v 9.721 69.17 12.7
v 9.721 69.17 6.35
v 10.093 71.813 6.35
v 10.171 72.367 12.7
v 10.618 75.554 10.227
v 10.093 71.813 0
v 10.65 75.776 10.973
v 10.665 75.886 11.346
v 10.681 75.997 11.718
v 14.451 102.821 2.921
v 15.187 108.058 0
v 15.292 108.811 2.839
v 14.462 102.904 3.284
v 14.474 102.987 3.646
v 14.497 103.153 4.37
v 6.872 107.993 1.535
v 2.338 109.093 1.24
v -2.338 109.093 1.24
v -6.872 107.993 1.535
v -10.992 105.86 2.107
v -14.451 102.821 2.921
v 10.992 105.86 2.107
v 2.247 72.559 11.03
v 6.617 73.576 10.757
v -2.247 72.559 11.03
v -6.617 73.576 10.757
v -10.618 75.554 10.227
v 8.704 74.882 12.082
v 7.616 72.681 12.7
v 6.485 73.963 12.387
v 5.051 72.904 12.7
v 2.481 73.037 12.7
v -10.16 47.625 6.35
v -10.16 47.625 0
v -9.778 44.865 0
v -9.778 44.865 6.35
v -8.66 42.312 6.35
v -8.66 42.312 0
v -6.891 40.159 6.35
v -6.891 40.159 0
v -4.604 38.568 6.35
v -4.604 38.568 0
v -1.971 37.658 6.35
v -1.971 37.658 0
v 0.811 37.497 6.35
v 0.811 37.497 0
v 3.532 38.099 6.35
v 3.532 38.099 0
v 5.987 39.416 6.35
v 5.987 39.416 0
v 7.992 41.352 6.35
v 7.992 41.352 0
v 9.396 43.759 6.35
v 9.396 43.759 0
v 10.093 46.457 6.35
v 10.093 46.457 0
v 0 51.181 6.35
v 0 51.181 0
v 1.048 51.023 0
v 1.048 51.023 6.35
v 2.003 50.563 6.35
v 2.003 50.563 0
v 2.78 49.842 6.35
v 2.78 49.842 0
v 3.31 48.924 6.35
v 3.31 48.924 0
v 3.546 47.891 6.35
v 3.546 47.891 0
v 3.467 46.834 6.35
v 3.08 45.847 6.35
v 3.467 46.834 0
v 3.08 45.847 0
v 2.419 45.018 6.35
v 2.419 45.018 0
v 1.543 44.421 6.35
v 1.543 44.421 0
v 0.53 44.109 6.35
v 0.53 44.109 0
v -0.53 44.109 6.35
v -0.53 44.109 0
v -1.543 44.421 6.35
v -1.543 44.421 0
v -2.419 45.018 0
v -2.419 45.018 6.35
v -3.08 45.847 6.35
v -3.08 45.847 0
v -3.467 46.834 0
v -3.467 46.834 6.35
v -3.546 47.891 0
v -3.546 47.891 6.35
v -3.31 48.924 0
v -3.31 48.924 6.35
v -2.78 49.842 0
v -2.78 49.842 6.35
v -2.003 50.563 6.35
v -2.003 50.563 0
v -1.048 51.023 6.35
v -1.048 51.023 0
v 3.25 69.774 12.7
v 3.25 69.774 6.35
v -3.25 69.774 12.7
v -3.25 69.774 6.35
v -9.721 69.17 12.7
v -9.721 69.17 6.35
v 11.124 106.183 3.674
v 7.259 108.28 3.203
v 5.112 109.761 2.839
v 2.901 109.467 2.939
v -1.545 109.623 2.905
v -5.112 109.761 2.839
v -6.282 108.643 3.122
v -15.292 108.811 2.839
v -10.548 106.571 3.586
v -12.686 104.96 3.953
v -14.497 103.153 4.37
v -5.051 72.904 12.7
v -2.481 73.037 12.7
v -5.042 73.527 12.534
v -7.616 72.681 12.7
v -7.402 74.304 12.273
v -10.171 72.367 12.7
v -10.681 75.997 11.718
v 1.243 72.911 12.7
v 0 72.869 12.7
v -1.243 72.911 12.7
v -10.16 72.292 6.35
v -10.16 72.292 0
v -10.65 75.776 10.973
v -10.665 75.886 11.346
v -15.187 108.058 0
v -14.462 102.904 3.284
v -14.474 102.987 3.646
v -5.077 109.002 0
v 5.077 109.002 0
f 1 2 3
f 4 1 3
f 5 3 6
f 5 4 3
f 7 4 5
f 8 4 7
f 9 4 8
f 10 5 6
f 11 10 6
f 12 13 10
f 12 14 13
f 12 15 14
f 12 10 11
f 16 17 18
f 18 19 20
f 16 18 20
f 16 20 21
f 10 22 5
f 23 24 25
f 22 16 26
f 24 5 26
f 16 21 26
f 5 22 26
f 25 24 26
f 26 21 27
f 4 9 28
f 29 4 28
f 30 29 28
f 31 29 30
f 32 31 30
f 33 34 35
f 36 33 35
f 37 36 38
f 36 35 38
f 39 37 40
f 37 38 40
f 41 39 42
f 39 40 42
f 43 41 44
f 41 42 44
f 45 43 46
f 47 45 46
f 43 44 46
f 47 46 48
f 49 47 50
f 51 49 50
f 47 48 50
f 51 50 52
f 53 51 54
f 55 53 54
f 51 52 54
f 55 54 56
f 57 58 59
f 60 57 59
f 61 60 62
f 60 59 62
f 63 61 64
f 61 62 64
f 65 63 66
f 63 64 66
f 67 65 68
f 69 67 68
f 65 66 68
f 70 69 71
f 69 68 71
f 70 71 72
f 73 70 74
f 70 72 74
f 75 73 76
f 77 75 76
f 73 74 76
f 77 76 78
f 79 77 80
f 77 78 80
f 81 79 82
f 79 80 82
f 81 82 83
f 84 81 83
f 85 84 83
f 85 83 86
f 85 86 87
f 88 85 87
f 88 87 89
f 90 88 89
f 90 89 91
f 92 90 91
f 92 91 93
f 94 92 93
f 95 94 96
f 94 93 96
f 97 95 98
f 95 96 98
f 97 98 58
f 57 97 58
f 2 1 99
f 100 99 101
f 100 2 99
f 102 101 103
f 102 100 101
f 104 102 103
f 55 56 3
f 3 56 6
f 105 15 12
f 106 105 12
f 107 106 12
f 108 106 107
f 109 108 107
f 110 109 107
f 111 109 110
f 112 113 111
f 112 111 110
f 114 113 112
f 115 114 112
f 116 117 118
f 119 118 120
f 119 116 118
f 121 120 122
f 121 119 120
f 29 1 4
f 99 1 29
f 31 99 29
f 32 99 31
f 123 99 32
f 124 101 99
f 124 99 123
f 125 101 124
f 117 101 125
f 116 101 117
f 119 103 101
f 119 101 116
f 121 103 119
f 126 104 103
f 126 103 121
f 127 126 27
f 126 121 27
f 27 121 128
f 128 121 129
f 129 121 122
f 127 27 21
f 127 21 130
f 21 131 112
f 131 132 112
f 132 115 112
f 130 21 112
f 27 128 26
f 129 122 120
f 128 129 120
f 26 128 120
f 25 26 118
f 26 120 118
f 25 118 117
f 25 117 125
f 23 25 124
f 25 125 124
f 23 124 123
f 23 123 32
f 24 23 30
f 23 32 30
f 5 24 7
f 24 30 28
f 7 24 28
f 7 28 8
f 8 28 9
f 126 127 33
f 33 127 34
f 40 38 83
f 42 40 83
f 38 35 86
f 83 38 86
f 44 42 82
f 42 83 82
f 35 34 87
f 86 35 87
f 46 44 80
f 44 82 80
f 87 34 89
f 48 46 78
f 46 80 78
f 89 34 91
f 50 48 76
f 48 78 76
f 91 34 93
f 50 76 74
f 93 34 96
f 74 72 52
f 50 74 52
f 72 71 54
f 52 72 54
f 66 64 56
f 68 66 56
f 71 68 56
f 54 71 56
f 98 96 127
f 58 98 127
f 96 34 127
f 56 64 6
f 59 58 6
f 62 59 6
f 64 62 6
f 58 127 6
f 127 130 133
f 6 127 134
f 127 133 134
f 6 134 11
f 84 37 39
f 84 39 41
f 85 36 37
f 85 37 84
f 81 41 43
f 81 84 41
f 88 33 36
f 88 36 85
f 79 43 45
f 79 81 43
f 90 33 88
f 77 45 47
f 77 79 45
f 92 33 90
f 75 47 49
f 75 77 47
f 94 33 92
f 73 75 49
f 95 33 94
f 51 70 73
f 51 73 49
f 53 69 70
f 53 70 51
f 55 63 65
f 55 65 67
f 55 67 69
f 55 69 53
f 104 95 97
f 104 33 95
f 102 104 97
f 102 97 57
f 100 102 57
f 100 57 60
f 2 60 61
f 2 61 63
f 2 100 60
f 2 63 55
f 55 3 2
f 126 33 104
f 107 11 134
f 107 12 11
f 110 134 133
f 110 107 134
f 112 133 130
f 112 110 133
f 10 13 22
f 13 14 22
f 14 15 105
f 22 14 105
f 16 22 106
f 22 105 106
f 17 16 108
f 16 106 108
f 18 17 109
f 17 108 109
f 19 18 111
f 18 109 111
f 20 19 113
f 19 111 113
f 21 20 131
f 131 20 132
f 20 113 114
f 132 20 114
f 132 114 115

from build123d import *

# Parameters (mm, degrees)
F1_DEPTH      = 6.35
F3_ANGLE_BACK = 8
F3_ANGLE      = 16


with BuildPart() as f1:
    # F0 (on Top) → F1 (new body)
    with BuildSketch(Plane.XY):
        with BuildLine():
            ThreePointArc((-10.16, 69.1071407309), (-5.093560638, 69.664037638), (0, 69.85))
            ThreePointArc((0, 69.85), (5.0595865172, 69.6665133638), (10.0925913162, 69.1170174452))
            Line((10.0925913162, 69.1170174452), (10.0925913162, 88.1571407309))
            Line((10.0925913162, 88.1571407309), (-10.16, 88.1571407309))
            Line((-10.16, 88.1571407309), (-10.16, 69.1071407309))
        make_face()
        with BuildLine():
            ThreePointArc((10.0925913162, 69.1170174452), (5.0595865172, 69.6665133638), (0, 69.85))
            ThreePointArc((0, 69.85), (-5.093560638, 69.664037638), (-10.16, 69.1071407309))
            Line((-10.16, 69.1071407309), (-10.16, 47.625))
            ThreePointArc((-10.16, 47.625), (-0.5851804113, 37.4818661704), (10.0925913162, 46.456582042))
            Line((10.0925913162, 46.456582042), (10.0925913162, 69.1071407309))
            Line((10.0925913162, 69.1071407309), (10.0925913162, 69.1170174452))
        make_face()
        with BuildLine():
            ThreePointArc((3.556, 47.625), (-2.5144717139, 45.1105282861), (0, 51.181))
            ThreePointArc((0, 51.181), (2.5144717139, 50.1394717139), (3.556, 47.625))
        make_face(mode=Mode.SUBTRACT)
    extrude(amount=F1_DEPTH)

    # F2 (on Right) → F3 (revolve)
    with BuildSketch(Plane.YZ, mode=Mode.PRIVATE) as f3_sk:
        Polygon((69.85, 6.35), (69.85, 0), (109.1197147274, 0), (109.8804209793, 2.8389943816), (73.0786469976, 12.7), (69.85, 12.7), align=None)
    revolve(f3_sk.sketch.rotate(Axis((0, 0, 0), (0, 0, 1)), -F3_ANGLE_BACK), axis=Axis((0, 0, 0), (0, 0, 1)), revolution_arc=F3_ANGLE)

    # F4 (on Right) → F5 (revolve, cut)
    with BuildSketch(Plane.YZ):
        Polygon((91.6529184641, 9.2004434954), (90.8311679959, 6.1336289969), (109.2320549867, 1.2031261877), (110.0538054549, 4.2699406862), align=None)
    revolve(axis=Axis((0, 91.24204323, 7.6670362462), (0, 0.2588190451, 0.9659258263)), mode=Mode.SUBTRACT)


solid = f1.part
